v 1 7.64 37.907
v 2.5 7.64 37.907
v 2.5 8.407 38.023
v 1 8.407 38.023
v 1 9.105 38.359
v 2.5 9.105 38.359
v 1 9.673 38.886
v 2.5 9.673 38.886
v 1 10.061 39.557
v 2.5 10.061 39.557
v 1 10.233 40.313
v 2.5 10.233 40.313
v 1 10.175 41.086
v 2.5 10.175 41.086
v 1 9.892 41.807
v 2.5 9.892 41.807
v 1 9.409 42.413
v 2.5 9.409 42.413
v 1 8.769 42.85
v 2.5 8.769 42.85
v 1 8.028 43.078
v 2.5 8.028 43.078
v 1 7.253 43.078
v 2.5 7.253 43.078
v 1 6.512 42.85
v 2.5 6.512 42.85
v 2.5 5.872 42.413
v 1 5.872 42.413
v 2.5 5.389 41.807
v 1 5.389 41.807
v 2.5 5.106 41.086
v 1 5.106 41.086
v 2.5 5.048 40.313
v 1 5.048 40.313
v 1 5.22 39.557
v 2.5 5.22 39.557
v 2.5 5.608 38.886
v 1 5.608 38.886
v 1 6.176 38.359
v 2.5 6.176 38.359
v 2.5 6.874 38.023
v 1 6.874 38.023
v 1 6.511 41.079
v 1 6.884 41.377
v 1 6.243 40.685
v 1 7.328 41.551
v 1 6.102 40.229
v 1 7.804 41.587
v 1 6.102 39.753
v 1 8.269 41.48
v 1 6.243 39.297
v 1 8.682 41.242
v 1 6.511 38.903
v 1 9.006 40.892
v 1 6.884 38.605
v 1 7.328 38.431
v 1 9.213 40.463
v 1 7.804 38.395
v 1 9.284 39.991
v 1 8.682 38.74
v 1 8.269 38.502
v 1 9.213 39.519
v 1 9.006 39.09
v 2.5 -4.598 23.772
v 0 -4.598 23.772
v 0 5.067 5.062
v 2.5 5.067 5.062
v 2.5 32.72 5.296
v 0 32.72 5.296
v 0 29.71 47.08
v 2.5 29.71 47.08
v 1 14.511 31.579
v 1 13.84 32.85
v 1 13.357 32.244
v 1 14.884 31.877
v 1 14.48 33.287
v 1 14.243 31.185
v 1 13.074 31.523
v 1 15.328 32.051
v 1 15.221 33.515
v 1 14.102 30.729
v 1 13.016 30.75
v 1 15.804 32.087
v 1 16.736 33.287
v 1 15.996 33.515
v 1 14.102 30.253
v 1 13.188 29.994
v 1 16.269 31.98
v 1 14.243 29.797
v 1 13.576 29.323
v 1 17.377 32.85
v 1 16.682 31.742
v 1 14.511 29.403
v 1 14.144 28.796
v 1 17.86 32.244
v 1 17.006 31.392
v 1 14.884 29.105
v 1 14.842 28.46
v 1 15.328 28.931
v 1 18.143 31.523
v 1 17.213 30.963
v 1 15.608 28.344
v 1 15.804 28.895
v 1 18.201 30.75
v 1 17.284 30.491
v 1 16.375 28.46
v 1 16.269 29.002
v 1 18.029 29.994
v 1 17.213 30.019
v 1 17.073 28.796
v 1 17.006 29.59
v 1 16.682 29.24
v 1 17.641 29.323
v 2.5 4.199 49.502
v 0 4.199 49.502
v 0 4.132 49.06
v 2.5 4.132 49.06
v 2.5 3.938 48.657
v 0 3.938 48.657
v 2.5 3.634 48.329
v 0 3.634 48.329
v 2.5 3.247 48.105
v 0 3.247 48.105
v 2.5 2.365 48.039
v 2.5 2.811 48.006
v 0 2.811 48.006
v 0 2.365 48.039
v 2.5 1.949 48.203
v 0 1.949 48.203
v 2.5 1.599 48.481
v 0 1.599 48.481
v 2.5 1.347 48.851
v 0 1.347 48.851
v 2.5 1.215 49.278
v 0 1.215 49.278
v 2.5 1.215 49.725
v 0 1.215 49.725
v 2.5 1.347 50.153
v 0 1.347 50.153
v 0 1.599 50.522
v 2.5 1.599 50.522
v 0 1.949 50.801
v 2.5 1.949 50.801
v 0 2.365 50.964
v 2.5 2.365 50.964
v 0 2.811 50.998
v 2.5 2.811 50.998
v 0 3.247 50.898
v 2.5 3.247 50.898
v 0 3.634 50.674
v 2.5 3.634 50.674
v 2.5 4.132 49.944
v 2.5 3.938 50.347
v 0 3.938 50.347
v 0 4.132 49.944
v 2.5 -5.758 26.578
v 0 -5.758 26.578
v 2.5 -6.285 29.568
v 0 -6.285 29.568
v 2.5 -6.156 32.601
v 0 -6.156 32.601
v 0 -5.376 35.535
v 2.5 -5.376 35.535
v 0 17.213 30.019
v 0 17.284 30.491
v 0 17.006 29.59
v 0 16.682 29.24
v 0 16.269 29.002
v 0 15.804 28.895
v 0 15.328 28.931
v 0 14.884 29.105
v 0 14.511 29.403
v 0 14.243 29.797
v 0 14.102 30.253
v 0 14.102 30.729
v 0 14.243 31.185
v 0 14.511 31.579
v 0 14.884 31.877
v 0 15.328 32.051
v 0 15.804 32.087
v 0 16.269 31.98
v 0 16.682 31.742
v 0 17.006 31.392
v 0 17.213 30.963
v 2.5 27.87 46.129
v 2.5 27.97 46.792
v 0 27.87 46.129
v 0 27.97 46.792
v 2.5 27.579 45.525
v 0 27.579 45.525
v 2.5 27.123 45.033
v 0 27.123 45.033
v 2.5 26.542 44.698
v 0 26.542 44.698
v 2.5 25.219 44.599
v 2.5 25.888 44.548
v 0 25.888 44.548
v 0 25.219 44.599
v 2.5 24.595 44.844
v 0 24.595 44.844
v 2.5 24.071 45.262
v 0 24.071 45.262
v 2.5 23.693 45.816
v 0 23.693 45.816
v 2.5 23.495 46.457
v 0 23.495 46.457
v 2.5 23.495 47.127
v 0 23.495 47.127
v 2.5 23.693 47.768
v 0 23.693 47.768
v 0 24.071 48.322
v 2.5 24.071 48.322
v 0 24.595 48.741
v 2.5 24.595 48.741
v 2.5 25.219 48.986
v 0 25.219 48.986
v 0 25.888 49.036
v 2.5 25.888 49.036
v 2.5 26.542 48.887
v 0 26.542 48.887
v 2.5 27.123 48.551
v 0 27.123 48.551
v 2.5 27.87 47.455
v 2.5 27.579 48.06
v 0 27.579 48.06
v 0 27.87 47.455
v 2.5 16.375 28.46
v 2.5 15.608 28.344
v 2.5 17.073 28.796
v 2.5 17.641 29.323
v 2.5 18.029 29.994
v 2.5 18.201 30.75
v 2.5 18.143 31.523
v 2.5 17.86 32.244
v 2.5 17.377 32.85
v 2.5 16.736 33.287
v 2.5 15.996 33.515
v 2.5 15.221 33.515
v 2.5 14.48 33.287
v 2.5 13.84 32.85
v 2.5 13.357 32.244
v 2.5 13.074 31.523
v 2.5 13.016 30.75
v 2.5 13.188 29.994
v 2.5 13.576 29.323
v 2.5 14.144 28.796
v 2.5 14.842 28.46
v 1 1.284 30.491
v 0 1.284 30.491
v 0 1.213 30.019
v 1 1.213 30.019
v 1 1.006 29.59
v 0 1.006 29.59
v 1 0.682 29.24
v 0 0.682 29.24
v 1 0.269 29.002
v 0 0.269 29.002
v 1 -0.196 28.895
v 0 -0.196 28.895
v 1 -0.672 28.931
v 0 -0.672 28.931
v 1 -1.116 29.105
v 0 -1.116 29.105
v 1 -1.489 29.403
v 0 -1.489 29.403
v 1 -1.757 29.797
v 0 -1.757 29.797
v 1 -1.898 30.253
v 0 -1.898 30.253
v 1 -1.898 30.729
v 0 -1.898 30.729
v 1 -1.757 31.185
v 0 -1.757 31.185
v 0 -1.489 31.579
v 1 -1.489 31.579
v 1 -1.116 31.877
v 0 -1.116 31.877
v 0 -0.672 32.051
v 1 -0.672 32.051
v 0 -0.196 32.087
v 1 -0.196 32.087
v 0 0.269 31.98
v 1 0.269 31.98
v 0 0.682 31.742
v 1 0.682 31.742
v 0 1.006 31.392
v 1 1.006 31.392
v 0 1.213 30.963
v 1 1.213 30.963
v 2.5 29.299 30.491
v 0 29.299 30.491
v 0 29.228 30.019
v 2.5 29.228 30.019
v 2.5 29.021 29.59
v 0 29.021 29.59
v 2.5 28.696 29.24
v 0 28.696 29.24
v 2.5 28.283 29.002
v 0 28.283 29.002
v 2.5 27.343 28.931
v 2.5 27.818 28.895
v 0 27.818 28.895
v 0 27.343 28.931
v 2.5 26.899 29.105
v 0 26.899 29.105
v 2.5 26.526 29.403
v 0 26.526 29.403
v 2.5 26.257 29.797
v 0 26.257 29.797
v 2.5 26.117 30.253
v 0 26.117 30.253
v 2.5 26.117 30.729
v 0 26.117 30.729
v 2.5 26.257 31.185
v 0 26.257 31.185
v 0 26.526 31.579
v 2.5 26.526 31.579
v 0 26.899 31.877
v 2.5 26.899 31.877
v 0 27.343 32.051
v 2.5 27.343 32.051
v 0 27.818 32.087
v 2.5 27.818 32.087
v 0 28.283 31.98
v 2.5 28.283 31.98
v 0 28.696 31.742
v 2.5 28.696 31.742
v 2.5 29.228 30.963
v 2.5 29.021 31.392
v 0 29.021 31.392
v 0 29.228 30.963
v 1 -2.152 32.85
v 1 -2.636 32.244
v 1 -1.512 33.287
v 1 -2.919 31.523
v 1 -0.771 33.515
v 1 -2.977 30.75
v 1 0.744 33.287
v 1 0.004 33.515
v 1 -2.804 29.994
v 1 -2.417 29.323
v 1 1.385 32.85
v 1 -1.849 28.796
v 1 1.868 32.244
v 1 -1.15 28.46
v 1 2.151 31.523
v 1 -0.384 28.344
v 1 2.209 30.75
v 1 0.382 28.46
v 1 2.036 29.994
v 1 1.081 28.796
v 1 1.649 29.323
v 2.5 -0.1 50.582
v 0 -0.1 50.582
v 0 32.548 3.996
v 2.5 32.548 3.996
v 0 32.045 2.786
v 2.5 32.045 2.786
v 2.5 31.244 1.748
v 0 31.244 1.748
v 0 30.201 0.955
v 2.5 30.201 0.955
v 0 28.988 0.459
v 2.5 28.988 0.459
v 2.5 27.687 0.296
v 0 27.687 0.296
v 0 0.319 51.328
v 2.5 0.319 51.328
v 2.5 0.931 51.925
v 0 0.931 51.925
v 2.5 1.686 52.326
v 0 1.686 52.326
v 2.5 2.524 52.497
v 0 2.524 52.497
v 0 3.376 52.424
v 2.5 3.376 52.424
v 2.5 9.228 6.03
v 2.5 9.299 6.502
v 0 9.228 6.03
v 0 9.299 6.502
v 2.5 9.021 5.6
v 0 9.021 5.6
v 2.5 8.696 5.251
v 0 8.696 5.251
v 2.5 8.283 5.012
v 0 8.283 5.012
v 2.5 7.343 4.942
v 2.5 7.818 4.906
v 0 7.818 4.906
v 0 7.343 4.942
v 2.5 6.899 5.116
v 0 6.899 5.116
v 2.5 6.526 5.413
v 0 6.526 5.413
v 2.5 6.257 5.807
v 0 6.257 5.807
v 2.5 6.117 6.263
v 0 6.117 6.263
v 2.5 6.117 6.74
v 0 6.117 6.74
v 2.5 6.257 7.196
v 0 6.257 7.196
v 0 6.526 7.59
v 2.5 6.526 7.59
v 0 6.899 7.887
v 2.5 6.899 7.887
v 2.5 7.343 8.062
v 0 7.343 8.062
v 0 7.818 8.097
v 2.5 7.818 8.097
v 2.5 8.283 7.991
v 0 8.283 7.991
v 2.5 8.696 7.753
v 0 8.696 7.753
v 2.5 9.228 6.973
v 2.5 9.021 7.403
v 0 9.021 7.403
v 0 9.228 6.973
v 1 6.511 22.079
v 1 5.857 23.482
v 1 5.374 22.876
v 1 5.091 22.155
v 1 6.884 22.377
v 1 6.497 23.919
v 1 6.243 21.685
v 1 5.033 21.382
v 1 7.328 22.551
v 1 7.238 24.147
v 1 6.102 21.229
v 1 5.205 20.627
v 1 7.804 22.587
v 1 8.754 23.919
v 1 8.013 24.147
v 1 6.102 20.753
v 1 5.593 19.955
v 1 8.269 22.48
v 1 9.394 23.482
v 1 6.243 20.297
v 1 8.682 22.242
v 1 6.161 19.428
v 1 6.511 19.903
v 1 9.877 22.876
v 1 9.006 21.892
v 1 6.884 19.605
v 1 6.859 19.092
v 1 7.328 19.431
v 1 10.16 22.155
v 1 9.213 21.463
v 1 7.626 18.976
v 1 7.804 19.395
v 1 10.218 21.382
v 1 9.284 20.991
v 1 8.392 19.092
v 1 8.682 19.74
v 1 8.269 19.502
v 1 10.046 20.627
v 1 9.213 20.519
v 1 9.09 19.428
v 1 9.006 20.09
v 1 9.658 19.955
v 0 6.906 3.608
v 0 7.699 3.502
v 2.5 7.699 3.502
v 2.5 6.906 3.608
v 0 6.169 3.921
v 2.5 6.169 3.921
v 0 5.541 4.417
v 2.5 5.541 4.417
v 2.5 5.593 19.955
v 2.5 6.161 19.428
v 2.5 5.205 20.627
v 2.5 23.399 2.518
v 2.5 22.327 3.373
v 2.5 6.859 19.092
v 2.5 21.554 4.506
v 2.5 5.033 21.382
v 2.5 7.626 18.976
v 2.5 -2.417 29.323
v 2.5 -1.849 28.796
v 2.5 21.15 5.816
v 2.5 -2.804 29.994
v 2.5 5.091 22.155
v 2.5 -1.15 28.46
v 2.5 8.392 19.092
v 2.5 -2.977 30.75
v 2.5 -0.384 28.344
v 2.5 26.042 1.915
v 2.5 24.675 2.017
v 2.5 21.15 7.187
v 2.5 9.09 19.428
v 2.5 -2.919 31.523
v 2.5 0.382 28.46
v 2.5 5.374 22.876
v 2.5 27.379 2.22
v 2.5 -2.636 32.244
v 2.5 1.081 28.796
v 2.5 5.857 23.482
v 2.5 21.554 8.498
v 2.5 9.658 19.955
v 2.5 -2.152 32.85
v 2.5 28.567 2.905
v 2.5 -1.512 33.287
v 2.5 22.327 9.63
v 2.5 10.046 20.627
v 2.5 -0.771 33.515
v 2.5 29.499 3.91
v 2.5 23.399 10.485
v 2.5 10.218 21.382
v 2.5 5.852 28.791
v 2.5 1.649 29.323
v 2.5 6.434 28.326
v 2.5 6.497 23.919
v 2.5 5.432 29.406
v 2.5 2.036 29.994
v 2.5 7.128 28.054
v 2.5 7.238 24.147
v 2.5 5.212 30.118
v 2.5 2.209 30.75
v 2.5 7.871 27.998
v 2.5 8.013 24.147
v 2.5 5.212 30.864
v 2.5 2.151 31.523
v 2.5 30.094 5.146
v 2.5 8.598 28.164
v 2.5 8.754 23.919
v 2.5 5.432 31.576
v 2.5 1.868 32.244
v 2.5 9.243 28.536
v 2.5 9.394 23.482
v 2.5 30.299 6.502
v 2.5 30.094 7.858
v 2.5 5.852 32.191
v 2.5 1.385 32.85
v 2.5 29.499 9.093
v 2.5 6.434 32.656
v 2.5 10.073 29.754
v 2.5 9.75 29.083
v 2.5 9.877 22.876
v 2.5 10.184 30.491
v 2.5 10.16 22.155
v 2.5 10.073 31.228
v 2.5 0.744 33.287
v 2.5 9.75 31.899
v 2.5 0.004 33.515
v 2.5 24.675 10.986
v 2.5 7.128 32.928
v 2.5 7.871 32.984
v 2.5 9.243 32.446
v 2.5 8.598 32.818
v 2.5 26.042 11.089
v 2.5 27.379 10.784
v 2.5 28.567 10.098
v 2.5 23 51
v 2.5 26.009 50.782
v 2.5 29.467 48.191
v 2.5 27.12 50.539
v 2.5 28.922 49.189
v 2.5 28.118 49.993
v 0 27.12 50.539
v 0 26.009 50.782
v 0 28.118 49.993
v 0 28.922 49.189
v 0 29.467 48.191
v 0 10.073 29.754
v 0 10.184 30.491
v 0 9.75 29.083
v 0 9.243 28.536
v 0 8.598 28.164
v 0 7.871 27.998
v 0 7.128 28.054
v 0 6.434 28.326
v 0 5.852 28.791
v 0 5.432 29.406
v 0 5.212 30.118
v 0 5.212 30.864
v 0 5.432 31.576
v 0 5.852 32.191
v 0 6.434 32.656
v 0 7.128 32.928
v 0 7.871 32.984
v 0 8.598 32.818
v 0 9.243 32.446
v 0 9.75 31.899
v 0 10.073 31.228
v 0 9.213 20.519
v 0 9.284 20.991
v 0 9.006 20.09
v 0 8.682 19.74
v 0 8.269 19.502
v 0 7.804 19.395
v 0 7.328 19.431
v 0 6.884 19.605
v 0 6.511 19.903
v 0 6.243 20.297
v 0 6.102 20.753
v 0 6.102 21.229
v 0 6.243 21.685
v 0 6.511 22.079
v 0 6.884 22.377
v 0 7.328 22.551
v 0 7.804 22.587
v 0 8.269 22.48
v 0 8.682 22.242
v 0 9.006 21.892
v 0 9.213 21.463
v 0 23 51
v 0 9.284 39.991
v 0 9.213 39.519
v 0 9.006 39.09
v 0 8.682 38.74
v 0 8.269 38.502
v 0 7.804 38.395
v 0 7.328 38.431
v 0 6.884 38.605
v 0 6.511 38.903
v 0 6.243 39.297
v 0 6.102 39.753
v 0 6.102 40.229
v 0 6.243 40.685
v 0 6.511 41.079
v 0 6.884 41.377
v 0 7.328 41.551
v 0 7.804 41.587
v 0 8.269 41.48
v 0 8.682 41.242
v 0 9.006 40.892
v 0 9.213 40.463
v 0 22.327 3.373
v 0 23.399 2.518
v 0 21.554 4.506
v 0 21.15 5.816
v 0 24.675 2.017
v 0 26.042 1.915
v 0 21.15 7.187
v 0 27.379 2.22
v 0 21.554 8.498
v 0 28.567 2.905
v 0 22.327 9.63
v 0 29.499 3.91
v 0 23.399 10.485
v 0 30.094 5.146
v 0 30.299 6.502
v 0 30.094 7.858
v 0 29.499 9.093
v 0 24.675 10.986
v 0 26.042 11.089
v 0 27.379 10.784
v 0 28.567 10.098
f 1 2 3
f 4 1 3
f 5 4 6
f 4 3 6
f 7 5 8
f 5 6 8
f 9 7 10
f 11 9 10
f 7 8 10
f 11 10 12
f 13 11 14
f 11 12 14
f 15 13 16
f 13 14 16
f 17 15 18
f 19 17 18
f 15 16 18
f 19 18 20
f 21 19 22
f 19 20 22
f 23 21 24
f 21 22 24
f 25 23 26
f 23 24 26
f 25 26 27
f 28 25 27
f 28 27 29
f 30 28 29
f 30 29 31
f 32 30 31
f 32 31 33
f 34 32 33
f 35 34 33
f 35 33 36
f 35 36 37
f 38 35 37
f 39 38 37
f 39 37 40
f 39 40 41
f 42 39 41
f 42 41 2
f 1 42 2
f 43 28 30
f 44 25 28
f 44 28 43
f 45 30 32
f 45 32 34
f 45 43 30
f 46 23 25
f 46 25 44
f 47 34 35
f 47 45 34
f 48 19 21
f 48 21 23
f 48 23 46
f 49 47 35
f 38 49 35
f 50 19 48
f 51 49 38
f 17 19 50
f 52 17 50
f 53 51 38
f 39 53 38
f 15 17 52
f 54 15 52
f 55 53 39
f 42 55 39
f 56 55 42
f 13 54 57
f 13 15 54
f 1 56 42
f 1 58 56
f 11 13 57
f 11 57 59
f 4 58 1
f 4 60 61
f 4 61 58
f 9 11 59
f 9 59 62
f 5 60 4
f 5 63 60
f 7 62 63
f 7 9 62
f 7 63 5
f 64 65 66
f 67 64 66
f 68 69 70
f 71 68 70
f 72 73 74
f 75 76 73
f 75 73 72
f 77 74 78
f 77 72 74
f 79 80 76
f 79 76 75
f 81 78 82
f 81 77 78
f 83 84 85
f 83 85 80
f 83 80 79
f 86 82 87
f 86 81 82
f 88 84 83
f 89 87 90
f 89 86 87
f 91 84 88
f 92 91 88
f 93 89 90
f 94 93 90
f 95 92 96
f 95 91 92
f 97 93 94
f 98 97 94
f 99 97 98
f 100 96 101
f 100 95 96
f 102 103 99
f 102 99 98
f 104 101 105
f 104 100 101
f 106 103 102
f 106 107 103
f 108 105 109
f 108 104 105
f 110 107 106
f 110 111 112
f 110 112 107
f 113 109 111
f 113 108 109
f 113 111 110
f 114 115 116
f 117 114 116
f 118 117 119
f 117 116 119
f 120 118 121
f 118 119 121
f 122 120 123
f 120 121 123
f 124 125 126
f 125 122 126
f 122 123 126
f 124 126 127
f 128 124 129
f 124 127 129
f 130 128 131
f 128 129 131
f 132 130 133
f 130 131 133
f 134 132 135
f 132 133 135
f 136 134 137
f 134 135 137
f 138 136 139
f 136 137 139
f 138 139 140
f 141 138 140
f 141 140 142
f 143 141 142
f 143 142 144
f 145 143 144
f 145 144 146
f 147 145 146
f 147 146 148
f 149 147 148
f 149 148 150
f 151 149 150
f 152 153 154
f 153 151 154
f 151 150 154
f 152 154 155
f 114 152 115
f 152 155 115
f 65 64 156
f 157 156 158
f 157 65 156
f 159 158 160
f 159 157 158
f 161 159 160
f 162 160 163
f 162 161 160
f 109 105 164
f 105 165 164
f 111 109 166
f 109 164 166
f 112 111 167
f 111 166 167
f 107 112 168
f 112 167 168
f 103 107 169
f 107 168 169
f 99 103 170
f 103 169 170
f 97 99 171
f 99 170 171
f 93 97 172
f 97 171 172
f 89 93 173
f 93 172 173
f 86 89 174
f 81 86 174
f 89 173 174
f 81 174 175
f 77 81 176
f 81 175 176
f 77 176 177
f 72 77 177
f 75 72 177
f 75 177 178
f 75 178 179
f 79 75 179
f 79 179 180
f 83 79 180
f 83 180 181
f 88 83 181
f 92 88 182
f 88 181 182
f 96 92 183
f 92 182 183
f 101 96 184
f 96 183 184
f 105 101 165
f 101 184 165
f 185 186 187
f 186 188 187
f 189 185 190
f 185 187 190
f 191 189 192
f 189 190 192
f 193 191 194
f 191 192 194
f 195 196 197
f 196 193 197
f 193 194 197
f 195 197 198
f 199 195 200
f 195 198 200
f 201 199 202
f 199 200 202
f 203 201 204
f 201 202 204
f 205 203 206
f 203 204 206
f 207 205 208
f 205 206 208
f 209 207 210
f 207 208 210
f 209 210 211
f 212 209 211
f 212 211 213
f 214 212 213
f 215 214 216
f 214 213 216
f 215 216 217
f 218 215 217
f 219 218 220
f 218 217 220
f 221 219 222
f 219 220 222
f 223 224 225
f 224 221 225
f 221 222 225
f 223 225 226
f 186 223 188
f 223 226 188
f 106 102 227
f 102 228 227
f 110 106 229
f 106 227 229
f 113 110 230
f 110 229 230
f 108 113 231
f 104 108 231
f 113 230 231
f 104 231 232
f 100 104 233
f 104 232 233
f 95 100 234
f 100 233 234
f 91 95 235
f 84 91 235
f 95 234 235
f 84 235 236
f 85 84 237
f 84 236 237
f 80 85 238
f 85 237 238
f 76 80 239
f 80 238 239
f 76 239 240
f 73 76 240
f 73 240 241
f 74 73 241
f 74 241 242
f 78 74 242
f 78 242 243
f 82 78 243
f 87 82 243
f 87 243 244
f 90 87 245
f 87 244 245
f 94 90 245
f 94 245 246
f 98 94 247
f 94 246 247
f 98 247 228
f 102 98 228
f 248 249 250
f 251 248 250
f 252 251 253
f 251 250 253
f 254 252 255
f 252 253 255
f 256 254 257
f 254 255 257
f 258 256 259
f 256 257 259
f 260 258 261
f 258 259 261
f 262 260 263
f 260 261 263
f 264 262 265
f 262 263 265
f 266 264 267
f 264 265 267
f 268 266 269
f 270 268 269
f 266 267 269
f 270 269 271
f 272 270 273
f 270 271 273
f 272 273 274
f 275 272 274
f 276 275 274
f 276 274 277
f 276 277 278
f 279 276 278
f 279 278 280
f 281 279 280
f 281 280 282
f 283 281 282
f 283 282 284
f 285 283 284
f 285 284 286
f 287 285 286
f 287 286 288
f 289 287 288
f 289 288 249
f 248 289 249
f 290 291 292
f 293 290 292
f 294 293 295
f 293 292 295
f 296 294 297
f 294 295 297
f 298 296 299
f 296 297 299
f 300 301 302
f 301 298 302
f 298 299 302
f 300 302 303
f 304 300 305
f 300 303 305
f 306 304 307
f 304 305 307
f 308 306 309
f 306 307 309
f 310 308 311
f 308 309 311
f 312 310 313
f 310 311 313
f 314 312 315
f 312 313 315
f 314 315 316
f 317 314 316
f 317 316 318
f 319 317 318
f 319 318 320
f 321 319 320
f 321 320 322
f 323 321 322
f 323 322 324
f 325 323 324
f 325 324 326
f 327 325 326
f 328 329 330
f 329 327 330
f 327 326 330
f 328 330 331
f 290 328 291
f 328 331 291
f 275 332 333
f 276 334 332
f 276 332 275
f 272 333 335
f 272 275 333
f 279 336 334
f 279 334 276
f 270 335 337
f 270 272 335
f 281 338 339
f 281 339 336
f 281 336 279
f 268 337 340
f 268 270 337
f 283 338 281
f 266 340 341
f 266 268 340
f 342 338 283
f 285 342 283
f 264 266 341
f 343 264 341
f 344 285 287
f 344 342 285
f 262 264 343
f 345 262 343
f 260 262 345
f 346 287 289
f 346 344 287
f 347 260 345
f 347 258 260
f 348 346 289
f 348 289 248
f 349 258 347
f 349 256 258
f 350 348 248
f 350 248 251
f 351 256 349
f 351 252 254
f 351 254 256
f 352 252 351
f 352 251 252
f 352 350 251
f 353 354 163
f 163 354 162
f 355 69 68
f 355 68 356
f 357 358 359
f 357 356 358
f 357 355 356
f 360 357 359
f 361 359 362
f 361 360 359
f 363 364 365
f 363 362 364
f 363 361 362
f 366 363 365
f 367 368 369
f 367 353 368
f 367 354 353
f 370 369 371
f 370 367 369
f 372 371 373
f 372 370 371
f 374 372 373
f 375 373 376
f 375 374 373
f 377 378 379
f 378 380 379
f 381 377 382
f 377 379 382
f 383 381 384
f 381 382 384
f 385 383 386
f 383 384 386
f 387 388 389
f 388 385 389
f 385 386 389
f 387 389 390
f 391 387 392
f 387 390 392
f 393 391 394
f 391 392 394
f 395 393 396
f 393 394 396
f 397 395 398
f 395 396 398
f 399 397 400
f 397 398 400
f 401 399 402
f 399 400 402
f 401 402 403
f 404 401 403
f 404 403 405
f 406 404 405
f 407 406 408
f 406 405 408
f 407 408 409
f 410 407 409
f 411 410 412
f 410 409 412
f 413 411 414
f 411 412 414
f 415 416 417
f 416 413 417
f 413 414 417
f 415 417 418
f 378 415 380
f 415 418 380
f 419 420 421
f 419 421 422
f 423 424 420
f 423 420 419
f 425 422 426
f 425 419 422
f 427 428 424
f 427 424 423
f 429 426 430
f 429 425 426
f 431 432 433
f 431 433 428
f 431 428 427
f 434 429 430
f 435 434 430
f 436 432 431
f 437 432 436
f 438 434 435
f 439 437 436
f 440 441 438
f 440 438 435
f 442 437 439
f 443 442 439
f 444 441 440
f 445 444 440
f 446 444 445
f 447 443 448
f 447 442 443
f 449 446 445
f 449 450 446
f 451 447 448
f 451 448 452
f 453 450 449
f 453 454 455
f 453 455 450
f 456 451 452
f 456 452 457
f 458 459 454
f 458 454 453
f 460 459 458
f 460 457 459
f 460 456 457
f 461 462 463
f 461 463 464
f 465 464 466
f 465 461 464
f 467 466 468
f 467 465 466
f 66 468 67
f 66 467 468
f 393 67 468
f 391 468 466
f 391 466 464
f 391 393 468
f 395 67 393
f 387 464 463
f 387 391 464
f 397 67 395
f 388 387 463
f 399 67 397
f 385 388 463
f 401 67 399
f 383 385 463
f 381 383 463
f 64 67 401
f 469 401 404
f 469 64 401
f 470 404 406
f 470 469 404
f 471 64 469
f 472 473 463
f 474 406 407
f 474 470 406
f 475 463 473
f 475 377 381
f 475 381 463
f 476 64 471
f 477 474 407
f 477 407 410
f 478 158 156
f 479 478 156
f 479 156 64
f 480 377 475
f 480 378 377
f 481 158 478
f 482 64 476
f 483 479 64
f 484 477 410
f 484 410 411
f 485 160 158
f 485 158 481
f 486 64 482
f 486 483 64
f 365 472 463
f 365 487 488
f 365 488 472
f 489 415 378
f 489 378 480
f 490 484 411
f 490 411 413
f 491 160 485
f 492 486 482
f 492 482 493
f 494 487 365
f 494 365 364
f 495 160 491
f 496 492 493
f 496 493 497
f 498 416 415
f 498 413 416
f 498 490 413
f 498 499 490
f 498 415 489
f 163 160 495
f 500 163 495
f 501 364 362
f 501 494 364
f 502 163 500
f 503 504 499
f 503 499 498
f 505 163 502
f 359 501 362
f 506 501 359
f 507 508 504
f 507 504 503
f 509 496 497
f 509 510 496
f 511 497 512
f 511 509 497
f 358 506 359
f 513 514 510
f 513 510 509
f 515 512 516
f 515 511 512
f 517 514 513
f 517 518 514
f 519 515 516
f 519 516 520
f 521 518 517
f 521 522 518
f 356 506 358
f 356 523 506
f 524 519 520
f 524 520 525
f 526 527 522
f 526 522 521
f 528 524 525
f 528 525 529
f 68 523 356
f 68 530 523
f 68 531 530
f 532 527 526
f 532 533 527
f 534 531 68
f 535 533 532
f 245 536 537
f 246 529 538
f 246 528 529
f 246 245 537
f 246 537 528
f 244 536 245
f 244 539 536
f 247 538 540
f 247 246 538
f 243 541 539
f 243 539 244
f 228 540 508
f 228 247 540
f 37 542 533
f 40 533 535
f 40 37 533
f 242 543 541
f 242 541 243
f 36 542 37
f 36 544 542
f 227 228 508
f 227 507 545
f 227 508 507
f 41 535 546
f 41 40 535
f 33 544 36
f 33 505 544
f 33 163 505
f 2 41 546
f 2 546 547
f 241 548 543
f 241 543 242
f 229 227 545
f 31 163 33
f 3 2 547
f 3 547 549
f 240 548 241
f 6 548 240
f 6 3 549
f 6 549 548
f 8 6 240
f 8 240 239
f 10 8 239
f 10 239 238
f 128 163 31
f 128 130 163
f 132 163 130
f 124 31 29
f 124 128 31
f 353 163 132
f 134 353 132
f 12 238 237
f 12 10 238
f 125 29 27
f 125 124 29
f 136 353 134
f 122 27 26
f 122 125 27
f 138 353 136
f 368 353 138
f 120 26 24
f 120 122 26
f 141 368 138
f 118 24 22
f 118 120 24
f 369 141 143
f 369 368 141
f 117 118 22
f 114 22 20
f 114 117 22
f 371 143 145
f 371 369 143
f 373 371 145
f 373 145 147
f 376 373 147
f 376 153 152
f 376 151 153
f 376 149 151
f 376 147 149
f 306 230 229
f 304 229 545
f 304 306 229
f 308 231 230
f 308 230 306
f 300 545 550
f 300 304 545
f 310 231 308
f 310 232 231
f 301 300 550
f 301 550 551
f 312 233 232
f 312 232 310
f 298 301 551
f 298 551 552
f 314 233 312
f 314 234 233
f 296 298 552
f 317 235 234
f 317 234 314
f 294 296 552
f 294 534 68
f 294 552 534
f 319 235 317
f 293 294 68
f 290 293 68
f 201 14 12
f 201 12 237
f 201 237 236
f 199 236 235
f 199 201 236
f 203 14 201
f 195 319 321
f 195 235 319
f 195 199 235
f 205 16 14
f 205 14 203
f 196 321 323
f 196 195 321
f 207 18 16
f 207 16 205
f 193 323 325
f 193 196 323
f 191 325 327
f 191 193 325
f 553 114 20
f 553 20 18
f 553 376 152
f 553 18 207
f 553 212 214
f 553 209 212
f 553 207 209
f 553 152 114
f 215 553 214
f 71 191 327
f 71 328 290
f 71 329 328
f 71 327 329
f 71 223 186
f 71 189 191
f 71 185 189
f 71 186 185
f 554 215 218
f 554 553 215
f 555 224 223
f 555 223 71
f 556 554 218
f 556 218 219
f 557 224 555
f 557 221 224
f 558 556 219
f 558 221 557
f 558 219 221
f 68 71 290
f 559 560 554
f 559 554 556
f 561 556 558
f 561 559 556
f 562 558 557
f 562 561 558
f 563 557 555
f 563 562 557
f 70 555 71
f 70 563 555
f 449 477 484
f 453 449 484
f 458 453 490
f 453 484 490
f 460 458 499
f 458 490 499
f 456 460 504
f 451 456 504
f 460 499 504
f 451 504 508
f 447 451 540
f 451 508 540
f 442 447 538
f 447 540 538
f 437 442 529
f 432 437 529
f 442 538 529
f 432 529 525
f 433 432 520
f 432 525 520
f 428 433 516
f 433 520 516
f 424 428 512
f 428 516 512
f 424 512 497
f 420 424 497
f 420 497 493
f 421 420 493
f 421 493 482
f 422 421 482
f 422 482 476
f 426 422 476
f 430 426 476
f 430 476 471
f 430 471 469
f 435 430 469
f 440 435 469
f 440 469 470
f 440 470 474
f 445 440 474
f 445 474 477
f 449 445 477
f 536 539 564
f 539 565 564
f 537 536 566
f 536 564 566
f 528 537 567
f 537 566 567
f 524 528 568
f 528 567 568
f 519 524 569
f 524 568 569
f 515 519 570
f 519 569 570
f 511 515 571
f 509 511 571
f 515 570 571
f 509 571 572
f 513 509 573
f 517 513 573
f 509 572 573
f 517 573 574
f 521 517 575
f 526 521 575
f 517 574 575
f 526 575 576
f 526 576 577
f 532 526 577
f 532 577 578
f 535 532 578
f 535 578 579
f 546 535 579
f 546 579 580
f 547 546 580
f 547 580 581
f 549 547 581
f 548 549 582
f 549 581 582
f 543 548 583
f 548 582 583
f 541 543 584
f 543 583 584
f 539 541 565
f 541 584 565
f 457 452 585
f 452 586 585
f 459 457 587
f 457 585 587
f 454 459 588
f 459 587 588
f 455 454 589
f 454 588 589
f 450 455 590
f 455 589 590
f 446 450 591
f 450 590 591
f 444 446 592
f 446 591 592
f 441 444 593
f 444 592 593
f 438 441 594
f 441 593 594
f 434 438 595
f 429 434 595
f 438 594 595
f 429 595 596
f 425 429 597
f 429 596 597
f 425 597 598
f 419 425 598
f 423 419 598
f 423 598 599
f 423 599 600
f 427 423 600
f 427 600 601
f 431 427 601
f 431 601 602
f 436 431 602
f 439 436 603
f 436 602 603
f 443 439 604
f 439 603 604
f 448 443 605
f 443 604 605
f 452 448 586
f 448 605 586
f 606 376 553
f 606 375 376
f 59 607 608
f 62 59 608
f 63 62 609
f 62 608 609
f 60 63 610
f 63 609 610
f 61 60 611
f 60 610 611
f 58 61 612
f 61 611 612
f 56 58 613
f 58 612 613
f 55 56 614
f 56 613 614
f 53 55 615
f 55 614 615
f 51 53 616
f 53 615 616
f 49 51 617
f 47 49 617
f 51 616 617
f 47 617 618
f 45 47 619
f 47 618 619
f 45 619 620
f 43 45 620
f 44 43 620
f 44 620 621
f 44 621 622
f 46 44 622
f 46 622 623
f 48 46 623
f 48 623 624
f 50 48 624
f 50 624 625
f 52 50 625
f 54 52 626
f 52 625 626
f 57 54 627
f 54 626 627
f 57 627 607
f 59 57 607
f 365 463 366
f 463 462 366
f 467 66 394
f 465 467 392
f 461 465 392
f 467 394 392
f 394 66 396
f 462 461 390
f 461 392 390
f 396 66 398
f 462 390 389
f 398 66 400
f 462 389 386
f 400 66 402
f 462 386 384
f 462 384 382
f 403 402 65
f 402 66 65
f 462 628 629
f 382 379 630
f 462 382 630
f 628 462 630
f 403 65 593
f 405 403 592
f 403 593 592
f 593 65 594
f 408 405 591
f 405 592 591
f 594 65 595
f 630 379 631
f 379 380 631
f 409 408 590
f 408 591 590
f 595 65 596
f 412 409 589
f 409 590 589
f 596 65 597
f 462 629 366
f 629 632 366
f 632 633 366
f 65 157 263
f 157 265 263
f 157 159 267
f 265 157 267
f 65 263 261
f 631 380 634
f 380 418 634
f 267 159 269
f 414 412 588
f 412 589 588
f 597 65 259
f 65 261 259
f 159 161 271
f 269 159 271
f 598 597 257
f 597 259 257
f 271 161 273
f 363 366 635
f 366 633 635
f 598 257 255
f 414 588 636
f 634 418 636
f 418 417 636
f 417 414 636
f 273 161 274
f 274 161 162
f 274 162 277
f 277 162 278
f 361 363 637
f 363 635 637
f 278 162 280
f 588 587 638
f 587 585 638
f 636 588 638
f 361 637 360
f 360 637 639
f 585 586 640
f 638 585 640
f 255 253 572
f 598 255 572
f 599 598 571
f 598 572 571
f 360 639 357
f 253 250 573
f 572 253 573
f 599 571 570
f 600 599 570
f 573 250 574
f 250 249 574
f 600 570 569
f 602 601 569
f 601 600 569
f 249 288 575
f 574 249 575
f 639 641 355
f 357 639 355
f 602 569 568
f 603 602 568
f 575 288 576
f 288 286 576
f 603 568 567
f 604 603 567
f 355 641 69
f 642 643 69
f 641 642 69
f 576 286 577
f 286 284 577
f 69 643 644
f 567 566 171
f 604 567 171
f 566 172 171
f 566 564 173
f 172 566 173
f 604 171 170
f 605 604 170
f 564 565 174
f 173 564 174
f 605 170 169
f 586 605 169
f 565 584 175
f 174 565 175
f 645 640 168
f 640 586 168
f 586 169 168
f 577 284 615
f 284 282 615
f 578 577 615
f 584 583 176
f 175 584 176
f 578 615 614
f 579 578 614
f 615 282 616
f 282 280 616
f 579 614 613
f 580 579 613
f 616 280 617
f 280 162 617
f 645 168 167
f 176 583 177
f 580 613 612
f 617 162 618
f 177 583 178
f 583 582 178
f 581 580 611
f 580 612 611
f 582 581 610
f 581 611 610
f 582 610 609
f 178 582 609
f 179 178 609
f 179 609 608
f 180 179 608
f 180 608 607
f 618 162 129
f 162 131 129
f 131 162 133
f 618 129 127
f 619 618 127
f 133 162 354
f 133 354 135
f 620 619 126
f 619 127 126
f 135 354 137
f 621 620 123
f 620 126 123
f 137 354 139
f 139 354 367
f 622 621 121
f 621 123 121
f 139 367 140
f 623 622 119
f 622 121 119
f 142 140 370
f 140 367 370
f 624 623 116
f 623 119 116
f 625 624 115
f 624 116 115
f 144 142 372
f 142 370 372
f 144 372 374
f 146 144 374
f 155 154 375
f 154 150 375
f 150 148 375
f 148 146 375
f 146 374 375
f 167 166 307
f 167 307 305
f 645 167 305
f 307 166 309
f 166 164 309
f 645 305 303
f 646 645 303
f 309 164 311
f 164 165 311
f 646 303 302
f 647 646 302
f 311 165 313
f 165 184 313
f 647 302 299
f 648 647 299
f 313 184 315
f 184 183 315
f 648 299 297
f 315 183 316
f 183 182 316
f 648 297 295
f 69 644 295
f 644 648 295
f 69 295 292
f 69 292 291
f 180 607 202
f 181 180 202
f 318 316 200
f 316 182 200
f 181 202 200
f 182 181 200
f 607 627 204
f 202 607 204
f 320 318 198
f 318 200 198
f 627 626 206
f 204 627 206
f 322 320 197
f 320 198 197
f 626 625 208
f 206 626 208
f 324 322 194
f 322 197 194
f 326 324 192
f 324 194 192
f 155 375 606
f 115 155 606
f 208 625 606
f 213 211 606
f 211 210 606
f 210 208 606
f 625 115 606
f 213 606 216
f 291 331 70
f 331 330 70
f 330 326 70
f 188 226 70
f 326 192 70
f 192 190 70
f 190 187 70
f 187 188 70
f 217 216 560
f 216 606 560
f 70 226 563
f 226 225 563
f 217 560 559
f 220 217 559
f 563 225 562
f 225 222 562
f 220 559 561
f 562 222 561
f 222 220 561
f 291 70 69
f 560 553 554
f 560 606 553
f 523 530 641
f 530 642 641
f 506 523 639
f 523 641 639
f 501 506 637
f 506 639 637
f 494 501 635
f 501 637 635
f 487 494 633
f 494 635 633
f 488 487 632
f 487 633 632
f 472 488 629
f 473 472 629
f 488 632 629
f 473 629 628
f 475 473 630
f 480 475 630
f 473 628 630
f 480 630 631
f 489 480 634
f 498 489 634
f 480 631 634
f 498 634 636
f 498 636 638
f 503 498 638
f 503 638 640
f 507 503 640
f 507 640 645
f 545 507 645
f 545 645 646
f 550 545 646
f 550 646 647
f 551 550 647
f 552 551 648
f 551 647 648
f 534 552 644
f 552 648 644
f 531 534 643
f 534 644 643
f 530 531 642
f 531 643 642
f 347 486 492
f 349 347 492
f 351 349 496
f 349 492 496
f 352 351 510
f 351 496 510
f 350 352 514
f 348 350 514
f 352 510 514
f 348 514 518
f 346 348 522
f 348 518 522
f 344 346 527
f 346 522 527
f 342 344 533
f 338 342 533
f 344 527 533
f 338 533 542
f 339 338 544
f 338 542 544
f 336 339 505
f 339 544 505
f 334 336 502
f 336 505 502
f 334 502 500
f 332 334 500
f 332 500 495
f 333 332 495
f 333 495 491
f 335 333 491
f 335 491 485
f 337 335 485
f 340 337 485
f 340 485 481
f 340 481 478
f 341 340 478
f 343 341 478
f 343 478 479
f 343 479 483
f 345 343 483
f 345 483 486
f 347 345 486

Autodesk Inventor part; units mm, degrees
ref_plane "YZ Plane" through (0, 0, 0) normal (1, 0, 0) x (0, 1, 0)
ref_plane "XZ Plane" through (0, 0, 0) normal (0, 1, 0) x (-1, 0, 0)
ref_plane "XY Plane" through (0, 0, 0) normal (0, 0, 1) x (1, 0, 0)
sketch "Эскиз1" plane through (0, 0, 0) normal (1, 0, 0) x (0, 1, 0)
  circle A0 centre (25.7199, 46.7921) radius 2.25
  circle A1 centre (25.6987, 6.5017) radius 4.6
  circle A2 centre (7.6987, 6.5017) radius 1.6
  arc A3 (27.6873, 0.2956) -> (32.7199, 5.2955) centre (27.7199, 5.2955) ccw
  circle A4 centre (7.6843, 30.491) radius 14
  arc A5 (14.2267, 42.8683) -> (-1.4853, 19.9118) centre (7.6843, 30.491) ccw
  circle A6 centre (27.6987, 30.491) radius 1.6
  line L0 (7.6843, 30.491) -> (25.6987, 6.5017)
  line L1 (-6.3157, 30.491) -> (21.6843, 30.491)
  line L2 (7.6843, 16.491) -> (7.6843, 44.491)
  circle A7 centre (7.6843, 30.491) radius 2.5
  circle A8 centre (-0.3157, 30.491) radius 1.6
  circle A9 centre (15.6843, 30.491) radius 1.6
  circle A10 centre (7.6843, 20.991) radius 1.6
  circle A11 centre (7.6843, 39.991) radius 1.6
  circle A12 centre (2.6987, 49.5017) radius 1.5
  circle A13 centre (7.6987, 6.5017) radius 3
  line L3 (7.6987, 3.5017) -> (27.6873, 0.2956)
  circle A14 centre (2.6987, 49.5017) radius 3
  line L4 (-3.2958, 40.9198) -> (-5.3755, 35.5348)
  line L5 (-0.0999, 50.5825) -> (-5.3755, 35.5348)
  line L6 (-1.3769, 17.8835) -> (-4.5981, 23.7723)
  line L7 (-4.5981, 23.7723) -> (5.0667, 5.062)
  circle A15 centre (25.7199, 46.7921) radius 4
  line L8 (2.4504, 52.4914) -> (23, 51)
  line L9 (2.4504, 52.4914) -> (26.0094, 50.7816)
  line L10 (32.7199, 5.2955) -> (29.7095, 47.0795)
  point P0 (0, 0)
  point P1 (-2.3427, 0)
  point P2 (7.6843, 30.491)
  point P3 (7.6843, 30.491)
  point P4 (-4.5981, 23.7723)
  point P5 (-3.3371, 41.4181)
  point P6 (-5.3755, 35.5348)
  point P7 (5.0013, 5.1886)
  point P8 (-0.1621, 50.405)
  point P9 (3.376, 52.4242)
  dimension "d9" = 4.5
  dimension "d86" = 9.2
  dimension "d87" = 3.2
  dimension "d92" = 5
  dimension "d132" = 28
  dimension "d145" = 3.2
  dimension "d191" = 30
  dimension "d194" = 5
  dimension "d195" = 3.2
  dimension "d196" = 3.2
  dimension "d197" = 3.2
  dimension "d198" = 3.2
  dimension "d199" = 8
  dimension "d200" = 8
  dimension "d201" = 9.5
  dimension "d202" = 9.5
  dimension "d227" = 3
  dimension "d234" = 6
  dimension "d235" = 6
  dimension "d242" = 8
extrude "Выдавливание1" add sketch "Эскиз1" along normal blind 2.5 contours A13 | A4 L5 A14 L8 L9 A15 L10 A3 L3 A13 L7 | A4 L2 A10 A7 L0 | L0 A7 L1 A9 A4 | A4 L1 A8 A7 L2 A10 | L1 A9 A7 L2 A11 A4 | L8 A14 | L2 A11 A7 L1 A8 A4 | A15
sketch "Эскиз8" plane through (2.5, 0, 0) normal (1, 0, 0) x (0, 0, -1)
  circle A0 centre (-40.5072, 7.6405) radius 1.6
  circle A1 centre (-40.5072, 7.6405) radius 2.6
  circle A2 centre (-30.9442, -0.3839) radius 1.6
  circle A3 centre (-30.9442, -0.3839) radius 2.6
  circle A4 centre (-21.5765, 7.6255) radius 1.6
  circle A5 centre (-21.5765, 7.6255) radius 2.6
  circle A6 centre (-30.9442, 15.6084) radius 1.6
  circle A7 centre (-30.9442, 15.6084) radius 2.6
  point P0 (0, 0)
  dimension "d205" = 3.2
  dimension "d206" = 5.2
  dimension "d207" = 3.2
  dimension "d208" = 5.2
  dimension "d210" = 3.2
  dimension "d211" = 5.2
  dimension "d216" = 3.2
  dimension "d217" = 5.2
extrude "Выдавливание9" cut sketch "Эскиз8" against normal blind 1.5 contours A0 | A1 | A2 | A3 | A4 | A5 | A6 | A7
equation "\"Радиус_гибки\" = Толщина"
equation "\"Ширина_просечки\" = Толщина"
equation "\"Глубина_просечки\" = 0.5 * Толщина"
equation "\"Размер_просечки\" = 4 * Толщина"
equation "\"Мин_остаток\" = 2 * Толщина"
equation "\"Радиус_перехода\" = Радиус_гибки"
equation "\"Радиус_Якоби\" = Радиус_гибки"
equation "\"Размер_зазора\" = Толщина"
equation "\"Толщина\" = 3.048"
properties part number "drib_rig"
